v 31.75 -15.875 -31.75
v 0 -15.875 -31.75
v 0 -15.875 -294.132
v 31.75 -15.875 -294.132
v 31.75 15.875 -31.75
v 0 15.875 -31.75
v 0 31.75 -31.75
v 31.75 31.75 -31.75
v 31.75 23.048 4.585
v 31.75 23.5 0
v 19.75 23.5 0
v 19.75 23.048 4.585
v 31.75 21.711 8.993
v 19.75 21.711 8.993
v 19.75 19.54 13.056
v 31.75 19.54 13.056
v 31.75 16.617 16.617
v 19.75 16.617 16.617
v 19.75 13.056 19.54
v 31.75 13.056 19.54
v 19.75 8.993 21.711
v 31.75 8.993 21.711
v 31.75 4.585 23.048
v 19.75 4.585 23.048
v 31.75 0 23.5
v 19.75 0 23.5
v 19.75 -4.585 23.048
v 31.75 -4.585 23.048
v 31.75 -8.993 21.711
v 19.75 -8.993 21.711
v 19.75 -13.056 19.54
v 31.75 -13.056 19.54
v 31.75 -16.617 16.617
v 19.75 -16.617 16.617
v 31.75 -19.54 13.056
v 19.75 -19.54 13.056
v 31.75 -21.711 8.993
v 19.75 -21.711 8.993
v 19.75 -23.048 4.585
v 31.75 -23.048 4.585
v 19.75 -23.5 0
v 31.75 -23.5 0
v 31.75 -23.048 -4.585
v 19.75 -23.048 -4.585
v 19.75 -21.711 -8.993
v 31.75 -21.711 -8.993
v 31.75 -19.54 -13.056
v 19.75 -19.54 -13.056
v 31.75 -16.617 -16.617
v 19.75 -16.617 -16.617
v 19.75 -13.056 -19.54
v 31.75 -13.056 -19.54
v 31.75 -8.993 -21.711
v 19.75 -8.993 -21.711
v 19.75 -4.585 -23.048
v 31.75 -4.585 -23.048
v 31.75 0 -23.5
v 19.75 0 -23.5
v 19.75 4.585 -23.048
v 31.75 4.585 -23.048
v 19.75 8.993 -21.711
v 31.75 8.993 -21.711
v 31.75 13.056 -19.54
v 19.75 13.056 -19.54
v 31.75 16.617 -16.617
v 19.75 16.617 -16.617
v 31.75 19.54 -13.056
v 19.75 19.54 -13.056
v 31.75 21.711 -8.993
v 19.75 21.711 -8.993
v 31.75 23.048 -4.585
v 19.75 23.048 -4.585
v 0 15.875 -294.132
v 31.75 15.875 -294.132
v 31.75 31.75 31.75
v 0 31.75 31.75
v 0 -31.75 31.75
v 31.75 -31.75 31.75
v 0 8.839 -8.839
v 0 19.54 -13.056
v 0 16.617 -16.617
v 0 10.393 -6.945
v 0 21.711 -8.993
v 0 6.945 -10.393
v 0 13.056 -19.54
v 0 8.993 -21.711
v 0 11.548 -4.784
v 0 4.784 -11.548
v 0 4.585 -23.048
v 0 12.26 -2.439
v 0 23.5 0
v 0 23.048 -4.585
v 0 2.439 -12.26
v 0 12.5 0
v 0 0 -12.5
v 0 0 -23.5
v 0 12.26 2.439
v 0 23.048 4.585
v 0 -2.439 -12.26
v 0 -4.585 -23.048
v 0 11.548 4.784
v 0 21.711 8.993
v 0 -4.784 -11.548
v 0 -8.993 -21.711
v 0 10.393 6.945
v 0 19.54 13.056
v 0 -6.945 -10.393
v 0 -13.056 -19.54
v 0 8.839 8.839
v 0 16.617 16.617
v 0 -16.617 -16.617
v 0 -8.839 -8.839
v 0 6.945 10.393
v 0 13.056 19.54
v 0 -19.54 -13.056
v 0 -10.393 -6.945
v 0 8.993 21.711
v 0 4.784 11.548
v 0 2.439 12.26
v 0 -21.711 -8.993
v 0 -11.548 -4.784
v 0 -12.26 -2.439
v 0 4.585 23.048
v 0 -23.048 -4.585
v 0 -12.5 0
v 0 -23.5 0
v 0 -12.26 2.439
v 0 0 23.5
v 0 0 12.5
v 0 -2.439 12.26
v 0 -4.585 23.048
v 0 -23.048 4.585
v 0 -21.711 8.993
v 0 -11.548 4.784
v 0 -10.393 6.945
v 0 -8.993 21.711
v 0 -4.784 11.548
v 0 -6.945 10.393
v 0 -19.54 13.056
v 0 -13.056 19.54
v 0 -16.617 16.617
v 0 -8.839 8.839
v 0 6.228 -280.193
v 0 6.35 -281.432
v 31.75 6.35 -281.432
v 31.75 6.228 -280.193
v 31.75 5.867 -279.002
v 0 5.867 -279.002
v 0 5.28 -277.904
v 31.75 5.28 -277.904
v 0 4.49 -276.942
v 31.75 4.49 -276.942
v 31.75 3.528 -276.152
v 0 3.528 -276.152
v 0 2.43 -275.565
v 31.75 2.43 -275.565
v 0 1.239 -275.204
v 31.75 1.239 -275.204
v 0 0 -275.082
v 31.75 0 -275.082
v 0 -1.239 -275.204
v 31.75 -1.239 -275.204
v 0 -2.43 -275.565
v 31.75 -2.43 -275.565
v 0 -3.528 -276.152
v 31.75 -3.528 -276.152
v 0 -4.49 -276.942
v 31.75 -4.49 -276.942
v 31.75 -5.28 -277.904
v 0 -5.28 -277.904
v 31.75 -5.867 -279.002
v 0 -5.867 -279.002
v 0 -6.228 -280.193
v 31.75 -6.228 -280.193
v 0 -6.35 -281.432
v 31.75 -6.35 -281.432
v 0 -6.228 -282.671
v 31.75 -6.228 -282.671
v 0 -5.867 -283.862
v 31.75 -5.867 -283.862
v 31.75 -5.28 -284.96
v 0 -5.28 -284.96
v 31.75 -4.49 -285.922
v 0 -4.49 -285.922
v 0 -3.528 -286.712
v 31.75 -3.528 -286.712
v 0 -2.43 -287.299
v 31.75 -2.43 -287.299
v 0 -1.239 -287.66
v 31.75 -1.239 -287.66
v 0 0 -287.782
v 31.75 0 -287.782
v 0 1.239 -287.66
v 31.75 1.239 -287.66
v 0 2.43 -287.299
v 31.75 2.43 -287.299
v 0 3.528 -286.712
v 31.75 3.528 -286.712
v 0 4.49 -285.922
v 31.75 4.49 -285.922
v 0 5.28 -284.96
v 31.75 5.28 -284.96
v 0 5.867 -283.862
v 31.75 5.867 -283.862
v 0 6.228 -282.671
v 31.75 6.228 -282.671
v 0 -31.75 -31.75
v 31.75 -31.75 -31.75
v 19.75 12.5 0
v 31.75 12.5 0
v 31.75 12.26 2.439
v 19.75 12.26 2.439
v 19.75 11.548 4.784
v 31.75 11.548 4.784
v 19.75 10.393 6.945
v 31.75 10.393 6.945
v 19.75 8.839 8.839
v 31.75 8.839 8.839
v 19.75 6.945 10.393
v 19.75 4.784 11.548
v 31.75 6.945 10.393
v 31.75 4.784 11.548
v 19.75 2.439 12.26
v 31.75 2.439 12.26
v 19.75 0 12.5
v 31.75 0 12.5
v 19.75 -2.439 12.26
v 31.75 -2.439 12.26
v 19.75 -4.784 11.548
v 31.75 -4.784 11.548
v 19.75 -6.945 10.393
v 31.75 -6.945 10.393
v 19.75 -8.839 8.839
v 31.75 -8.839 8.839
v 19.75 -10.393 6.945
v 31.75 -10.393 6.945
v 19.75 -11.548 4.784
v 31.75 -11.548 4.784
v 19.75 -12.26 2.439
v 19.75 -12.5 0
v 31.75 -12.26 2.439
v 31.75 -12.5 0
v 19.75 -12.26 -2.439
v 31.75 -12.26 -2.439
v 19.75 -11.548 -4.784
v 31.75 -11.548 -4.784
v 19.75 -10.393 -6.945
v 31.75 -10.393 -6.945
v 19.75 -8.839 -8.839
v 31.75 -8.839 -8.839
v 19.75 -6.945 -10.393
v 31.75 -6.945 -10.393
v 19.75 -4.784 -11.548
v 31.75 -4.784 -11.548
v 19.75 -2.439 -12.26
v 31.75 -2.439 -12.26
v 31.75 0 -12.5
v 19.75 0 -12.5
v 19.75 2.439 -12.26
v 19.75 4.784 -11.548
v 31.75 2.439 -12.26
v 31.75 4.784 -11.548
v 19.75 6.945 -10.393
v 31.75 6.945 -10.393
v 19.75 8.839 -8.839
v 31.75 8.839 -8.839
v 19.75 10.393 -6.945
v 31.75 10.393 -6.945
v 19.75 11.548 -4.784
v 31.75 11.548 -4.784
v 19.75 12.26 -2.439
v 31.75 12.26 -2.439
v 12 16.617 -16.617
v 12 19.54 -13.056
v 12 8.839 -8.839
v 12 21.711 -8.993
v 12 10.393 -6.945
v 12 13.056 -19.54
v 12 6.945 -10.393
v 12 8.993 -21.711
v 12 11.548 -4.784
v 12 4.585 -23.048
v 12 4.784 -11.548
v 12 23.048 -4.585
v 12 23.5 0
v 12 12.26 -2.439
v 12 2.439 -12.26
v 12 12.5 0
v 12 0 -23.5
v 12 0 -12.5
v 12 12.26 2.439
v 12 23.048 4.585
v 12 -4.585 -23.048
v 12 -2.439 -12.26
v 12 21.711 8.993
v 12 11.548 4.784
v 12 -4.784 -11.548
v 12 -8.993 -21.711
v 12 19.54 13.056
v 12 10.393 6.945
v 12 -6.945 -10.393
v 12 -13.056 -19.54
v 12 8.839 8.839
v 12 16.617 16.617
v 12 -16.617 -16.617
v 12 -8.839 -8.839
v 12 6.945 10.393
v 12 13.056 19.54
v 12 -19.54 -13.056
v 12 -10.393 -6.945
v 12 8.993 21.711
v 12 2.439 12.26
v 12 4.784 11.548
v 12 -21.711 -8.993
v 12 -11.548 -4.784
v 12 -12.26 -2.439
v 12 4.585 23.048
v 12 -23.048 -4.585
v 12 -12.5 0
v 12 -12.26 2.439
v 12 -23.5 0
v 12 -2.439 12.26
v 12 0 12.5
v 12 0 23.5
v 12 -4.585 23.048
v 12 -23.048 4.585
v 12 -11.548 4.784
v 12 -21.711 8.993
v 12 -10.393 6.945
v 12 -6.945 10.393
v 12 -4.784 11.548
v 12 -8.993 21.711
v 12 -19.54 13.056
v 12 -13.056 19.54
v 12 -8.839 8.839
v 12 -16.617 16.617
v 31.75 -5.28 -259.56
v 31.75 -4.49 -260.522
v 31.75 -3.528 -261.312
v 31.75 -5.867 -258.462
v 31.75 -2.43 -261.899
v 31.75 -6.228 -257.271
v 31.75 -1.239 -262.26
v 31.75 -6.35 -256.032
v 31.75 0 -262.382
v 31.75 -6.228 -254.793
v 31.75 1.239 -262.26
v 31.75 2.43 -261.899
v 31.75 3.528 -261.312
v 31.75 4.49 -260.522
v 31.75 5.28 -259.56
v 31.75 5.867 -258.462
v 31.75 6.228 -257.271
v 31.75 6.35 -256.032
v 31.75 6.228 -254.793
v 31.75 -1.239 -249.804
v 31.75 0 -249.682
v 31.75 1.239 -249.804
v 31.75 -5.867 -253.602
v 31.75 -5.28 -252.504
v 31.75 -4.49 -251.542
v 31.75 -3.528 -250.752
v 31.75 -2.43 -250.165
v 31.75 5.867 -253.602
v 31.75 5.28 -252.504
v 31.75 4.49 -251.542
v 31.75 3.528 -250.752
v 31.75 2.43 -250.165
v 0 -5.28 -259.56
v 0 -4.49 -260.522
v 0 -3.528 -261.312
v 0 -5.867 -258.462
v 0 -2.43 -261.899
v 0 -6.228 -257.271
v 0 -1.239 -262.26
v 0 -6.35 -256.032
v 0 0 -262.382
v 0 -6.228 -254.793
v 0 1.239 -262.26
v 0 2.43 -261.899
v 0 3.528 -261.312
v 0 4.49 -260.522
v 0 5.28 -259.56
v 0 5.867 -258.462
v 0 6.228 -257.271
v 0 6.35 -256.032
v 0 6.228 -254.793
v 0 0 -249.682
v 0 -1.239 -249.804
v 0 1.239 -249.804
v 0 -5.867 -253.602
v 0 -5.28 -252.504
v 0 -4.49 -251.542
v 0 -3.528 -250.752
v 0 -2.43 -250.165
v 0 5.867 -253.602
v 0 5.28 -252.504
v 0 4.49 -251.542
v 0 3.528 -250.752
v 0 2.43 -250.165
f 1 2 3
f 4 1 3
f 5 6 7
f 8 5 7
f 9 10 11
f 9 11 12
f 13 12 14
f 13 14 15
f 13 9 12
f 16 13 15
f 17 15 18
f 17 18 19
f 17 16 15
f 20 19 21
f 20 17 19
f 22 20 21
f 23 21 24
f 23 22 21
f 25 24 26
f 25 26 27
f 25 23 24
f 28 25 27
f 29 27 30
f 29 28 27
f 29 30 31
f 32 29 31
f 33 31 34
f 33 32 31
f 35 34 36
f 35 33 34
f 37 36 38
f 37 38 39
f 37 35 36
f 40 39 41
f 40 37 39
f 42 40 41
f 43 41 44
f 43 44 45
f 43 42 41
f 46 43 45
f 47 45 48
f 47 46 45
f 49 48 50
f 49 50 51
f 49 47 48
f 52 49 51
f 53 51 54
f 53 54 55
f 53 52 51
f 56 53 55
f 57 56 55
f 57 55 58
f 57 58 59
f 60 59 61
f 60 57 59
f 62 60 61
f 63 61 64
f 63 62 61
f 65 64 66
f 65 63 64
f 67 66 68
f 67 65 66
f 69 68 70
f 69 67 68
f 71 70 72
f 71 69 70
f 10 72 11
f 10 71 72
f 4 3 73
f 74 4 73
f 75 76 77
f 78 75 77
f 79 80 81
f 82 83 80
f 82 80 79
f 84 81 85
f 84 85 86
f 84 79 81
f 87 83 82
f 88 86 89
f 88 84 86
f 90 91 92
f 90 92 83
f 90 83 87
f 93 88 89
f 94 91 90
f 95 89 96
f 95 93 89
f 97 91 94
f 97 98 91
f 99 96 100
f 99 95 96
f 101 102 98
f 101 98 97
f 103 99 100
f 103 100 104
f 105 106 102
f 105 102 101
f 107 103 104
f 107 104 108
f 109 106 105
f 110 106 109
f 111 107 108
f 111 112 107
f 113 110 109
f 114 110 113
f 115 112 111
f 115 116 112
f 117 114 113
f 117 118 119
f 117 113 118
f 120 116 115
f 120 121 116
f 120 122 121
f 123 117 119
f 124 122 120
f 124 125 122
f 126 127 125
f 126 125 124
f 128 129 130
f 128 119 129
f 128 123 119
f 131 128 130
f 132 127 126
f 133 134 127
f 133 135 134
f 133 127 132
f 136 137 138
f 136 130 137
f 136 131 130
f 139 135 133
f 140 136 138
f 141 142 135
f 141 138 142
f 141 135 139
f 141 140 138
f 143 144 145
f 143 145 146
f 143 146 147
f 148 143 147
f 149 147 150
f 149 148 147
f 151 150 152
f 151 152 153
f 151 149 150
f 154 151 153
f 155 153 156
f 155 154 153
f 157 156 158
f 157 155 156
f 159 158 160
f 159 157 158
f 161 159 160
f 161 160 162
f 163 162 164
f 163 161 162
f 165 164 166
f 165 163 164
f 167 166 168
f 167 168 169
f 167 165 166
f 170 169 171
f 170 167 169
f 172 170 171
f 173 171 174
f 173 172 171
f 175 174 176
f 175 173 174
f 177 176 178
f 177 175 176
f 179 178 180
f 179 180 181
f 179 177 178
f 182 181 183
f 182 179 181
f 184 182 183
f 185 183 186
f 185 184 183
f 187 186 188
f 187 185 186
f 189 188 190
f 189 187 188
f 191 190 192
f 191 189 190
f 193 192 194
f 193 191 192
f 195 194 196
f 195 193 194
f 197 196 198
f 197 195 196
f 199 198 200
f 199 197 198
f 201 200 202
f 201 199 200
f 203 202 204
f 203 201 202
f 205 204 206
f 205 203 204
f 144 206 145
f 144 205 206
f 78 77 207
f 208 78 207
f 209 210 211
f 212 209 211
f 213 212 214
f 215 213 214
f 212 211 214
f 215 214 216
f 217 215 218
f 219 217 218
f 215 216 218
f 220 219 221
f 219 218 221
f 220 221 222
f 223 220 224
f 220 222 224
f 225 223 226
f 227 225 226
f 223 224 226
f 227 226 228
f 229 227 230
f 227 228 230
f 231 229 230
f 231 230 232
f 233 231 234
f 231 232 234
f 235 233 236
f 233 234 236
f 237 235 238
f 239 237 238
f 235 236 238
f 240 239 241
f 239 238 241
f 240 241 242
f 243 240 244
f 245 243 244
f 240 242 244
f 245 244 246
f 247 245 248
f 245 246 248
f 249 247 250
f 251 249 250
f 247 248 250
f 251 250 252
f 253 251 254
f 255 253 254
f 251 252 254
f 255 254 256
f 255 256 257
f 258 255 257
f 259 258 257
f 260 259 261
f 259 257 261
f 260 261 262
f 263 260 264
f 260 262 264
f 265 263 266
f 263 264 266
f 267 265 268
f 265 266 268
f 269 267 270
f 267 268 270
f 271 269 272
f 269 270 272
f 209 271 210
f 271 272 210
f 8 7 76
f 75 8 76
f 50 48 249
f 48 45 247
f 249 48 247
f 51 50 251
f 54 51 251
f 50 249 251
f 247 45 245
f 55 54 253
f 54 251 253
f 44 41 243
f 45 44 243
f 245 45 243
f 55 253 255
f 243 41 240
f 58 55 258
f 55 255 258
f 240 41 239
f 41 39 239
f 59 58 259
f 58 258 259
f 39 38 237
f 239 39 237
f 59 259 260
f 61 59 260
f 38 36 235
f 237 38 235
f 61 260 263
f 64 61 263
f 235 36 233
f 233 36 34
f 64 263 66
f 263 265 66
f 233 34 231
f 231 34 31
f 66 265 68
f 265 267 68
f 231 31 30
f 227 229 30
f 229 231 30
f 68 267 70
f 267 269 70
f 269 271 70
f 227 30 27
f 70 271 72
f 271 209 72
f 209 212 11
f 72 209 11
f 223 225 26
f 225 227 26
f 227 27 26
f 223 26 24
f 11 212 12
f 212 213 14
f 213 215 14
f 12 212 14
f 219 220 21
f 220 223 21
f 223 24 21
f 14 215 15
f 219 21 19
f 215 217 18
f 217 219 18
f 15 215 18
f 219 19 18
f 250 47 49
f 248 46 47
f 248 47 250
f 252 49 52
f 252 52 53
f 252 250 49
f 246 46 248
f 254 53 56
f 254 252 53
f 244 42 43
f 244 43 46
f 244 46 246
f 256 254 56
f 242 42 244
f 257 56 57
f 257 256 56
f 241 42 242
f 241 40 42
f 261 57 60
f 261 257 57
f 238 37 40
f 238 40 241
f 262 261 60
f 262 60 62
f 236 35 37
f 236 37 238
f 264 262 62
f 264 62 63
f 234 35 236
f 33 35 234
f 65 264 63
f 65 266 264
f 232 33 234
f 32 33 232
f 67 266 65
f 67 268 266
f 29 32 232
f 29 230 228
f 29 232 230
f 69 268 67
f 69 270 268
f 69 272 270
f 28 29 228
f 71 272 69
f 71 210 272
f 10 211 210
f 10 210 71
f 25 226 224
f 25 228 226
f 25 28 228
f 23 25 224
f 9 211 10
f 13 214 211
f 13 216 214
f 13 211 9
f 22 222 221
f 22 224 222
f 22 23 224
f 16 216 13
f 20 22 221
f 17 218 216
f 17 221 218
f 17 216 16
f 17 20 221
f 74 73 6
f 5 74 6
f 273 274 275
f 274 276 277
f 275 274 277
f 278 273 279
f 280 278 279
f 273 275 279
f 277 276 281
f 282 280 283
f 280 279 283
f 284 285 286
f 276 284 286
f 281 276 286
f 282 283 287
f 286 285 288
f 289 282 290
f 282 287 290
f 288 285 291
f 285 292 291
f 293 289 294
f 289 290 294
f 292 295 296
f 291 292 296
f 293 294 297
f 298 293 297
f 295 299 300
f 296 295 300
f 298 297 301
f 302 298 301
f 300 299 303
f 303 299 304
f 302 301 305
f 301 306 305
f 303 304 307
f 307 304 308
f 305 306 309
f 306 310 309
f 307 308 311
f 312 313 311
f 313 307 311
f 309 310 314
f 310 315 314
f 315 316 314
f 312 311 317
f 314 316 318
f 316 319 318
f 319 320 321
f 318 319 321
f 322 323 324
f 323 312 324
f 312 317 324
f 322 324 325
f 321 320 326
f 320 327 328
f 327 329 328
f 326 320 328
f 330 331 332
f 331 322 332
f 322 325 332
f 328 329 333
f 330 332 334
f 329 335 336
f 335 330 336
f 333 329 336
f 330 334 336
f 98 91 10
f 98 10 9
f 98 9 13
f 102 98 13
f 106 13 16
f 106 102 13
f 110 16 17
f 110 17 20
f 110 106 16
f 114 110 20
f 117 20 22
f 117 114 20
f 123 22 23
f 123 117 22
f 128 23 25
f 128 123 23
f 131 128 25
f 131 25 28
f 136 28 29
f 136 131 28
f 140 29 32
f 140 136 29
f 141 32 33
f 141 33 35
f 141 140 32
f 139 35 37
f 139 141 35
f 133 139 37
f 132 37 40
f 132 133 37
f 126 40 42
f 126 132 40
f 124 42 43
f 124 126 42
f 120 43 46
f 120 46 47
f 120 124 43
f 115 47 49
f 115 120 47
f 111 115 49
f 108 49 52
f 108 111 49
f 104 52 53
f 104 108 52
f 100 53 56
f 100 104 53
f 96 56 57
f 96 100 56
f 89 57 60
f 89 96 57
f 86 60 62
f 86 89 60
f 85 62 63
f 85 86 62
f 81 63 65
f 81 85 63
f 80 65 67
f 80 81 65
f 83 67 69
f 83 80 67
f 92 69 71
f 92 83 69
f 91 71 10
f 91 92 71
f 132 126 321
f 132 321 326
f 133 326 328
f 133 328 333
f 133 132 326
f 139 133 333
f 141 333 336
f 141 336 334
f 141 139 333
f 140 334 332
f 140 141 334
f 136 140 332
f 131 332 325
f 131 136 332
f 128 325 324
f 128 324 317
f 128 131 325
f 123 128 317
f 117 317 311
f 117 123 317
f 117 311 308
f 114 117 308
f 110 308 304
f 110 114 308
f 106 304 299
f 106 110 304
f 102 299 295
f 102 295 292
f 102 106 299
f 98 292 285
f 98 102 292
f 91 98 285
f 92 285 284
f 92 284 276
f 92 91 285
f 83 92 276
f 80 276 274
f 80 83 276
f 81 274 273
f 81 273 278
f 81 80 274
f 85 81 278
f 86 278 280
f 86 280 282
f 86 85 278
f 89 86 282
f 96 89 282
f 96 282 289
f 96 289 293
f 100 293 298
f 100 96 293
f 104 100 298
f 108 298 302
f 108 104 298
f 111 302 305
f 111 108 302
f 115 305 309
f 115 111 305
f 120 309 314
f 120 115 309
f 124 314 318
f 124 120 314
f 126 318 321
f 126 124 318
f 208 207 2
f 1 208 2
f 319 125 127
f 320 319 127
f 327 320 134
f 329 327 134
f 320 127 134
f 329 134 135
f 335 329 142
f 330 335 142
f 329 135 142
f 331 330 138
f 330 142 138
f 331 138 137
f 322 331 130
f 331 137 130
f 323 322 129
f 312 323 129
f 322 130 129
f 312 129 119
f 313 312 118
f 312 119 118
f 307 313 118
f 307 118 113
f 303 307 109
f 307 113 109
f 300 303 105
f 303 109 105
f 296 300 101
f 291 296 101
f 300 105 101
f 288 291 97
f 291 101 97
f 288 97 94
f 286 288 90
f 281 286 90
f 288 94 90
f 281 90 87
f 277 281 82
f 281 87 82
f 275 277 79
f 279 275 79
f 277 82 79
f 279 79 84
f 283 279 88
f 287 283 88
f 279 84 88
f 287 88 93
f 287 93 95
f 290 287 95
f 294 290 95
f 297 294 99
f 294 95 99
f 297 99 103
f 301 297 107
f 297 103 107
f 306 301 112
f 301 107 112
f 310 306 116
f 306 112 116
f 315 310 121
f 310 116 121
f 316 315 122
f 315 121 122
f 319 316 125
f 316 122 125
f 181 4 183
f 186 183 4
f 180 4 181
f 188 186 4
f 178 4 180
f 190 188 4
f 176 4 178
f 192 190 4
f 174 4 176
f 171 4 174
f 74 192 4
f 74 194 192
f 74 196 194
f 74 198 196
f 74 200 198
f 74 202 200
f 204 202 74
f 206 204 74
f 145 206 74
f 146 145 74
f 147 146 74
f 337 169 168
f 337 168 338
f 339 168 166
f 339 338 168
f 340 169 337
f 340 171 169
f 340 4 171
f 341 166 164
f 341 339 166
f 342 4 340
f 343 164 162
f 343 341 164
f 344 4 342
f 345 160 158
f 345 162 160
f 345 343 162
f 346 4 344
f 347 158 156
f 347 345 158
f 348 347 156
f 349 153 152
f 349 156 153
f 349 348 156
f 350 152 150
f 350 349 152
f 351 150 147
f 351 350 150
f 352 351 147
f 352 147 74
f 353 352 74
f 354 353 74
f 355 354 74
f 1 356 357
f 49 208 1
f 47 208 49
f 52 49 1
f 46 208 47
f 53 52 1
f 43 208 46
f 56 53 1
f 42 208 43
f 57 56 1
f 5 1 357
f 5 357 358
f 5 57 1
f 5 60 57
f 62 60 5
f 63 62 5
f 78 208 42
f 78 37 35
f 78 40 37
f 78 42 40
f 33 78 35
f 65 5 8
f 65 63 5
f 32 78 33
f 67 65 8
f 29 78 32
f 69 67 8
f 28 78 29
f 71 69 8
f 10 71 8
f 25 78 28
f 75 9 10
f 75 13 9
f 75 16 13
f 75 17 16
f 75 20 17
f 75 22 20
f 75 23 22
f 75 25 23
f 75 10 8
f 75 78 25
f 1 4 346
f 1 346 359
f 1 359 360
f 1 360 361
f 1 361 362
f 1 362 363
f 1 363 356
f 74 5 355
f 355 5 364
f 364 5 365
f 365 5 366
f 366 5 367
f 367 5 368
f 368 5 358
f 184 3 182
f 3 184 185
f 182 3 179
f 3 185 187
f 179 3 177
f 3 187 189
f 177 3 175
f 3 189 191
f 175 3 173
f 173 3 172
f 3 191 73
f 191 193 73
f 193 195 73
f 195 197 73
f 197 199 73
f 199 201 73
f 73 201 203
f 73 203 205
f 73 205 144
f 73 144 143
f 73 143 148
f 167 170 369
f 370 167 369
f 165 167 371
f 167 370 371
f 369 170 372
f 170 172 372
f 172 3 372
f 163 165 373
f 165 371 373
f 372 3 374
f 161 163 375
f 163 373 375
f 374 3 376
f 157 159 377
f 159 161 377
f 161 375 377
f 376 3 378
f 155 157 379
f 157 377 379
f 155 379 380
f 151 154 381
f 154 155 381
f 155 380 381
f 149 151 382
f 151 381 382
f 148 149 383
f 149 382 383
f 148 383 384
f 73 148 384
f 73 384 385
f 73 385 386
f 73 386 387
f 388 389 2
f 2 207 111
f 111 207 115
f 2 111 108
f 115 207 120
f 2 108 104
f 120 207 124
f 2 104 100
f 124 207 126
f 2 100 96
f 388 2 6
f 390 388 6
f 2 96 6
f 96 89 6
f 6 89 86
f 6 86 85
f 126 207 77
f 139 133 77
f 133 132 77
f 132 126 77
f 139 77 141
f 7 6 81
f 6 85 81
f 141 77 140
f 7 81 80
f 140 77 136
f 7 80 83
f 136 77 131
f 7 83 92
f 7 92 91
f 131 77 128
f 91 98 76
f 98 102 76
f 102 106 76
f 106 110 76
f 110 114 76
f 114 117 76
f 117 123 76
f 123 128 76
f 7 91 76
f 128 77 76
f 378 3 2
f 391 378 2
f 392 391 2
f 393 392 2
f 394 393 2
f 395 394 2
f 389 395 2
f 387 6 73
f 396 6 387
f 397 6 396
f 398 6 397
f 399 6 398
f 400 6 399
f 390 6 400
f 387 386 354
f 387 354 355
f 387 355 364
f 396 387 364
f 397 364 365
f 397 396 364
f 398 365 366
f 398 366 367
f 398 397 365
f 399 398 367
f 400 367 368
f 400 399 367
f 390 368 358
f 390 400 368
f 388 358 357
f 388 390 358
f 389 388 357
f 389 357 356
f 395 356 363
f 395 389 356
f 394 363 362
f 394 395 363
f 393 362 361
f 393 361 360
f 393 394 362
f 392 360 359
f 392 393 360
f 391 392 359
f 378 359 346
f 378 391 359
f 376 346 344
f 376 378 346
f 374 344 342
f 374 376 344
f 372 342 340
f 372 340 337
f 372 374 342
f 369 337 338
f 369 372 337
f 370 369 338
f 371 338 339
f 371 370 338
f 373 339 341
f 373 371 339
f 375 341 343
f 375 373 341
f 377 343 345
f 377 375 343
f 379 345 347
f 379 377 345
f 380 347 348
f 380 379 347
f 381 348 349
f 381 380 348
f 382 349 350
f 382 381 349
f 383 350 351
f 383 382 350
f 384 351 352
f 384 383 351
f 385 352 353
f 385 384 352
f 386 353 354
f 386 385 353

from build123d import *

# Parameters (mm, degrees)
F0_R     = 6.35
F0_R_2   = 23.5
F1_DEPTH = 31.75
F2_R     = 23.5
F2_R_2   = 12.5
F3_DEPTH = 12
F4_R     = 23.5
F4_R_2   = 12.5
F5_DEPTH = 12


with BuildPart() as f1:
    # F0 (on Right) → F1 (new body)
    with BuildSketch(Plane.YZ):
        Polygon((15.875, -31.75), (31.75, -31.75), (31.75, 31.75), (-31.75, 31.75), (-31.75, -31.75), (-15.875, -31.75), (-15.875, -294.132), (15.875, -294.132), align=None)
        with Locations((0, -281.432)):
            Circle(F0_R, mode=Mode.SUBTRACT)
        with Locations((0, -256.032)):
            Circle(F0_R, mode=Mode.SUBTRACT)
        Circle(F0_R_2, mode=Mode.SUBTRACT)
    extrude(amount=F1_DEPTH)


with BuildPart() as f3:
    # F2 (on face) → F3 (new body)
    with BuildSketch(Plane(origin=(0, 0, 0), x_dir=(0, -1, 0), z_dir=(-1, 0, 0))):
        Circle(F2_R)
        Circle(F2_R_2, mode=Mode.SUBTRACT)
    extrude(amount=-F3_DEPTH)


with BuildPart() as f5:
    # F4 (on face) → F5 (new body)
    with BuildSketch(Plane.YZ.offset(31.75)):
        Circle(F4_R)
        Circle(F4_R_2, mode=Mode.SUBTRACT)
    extrude(amount=-F5_DEPTH)


solid = Compound([f1.part, f3.part, f5.part])
